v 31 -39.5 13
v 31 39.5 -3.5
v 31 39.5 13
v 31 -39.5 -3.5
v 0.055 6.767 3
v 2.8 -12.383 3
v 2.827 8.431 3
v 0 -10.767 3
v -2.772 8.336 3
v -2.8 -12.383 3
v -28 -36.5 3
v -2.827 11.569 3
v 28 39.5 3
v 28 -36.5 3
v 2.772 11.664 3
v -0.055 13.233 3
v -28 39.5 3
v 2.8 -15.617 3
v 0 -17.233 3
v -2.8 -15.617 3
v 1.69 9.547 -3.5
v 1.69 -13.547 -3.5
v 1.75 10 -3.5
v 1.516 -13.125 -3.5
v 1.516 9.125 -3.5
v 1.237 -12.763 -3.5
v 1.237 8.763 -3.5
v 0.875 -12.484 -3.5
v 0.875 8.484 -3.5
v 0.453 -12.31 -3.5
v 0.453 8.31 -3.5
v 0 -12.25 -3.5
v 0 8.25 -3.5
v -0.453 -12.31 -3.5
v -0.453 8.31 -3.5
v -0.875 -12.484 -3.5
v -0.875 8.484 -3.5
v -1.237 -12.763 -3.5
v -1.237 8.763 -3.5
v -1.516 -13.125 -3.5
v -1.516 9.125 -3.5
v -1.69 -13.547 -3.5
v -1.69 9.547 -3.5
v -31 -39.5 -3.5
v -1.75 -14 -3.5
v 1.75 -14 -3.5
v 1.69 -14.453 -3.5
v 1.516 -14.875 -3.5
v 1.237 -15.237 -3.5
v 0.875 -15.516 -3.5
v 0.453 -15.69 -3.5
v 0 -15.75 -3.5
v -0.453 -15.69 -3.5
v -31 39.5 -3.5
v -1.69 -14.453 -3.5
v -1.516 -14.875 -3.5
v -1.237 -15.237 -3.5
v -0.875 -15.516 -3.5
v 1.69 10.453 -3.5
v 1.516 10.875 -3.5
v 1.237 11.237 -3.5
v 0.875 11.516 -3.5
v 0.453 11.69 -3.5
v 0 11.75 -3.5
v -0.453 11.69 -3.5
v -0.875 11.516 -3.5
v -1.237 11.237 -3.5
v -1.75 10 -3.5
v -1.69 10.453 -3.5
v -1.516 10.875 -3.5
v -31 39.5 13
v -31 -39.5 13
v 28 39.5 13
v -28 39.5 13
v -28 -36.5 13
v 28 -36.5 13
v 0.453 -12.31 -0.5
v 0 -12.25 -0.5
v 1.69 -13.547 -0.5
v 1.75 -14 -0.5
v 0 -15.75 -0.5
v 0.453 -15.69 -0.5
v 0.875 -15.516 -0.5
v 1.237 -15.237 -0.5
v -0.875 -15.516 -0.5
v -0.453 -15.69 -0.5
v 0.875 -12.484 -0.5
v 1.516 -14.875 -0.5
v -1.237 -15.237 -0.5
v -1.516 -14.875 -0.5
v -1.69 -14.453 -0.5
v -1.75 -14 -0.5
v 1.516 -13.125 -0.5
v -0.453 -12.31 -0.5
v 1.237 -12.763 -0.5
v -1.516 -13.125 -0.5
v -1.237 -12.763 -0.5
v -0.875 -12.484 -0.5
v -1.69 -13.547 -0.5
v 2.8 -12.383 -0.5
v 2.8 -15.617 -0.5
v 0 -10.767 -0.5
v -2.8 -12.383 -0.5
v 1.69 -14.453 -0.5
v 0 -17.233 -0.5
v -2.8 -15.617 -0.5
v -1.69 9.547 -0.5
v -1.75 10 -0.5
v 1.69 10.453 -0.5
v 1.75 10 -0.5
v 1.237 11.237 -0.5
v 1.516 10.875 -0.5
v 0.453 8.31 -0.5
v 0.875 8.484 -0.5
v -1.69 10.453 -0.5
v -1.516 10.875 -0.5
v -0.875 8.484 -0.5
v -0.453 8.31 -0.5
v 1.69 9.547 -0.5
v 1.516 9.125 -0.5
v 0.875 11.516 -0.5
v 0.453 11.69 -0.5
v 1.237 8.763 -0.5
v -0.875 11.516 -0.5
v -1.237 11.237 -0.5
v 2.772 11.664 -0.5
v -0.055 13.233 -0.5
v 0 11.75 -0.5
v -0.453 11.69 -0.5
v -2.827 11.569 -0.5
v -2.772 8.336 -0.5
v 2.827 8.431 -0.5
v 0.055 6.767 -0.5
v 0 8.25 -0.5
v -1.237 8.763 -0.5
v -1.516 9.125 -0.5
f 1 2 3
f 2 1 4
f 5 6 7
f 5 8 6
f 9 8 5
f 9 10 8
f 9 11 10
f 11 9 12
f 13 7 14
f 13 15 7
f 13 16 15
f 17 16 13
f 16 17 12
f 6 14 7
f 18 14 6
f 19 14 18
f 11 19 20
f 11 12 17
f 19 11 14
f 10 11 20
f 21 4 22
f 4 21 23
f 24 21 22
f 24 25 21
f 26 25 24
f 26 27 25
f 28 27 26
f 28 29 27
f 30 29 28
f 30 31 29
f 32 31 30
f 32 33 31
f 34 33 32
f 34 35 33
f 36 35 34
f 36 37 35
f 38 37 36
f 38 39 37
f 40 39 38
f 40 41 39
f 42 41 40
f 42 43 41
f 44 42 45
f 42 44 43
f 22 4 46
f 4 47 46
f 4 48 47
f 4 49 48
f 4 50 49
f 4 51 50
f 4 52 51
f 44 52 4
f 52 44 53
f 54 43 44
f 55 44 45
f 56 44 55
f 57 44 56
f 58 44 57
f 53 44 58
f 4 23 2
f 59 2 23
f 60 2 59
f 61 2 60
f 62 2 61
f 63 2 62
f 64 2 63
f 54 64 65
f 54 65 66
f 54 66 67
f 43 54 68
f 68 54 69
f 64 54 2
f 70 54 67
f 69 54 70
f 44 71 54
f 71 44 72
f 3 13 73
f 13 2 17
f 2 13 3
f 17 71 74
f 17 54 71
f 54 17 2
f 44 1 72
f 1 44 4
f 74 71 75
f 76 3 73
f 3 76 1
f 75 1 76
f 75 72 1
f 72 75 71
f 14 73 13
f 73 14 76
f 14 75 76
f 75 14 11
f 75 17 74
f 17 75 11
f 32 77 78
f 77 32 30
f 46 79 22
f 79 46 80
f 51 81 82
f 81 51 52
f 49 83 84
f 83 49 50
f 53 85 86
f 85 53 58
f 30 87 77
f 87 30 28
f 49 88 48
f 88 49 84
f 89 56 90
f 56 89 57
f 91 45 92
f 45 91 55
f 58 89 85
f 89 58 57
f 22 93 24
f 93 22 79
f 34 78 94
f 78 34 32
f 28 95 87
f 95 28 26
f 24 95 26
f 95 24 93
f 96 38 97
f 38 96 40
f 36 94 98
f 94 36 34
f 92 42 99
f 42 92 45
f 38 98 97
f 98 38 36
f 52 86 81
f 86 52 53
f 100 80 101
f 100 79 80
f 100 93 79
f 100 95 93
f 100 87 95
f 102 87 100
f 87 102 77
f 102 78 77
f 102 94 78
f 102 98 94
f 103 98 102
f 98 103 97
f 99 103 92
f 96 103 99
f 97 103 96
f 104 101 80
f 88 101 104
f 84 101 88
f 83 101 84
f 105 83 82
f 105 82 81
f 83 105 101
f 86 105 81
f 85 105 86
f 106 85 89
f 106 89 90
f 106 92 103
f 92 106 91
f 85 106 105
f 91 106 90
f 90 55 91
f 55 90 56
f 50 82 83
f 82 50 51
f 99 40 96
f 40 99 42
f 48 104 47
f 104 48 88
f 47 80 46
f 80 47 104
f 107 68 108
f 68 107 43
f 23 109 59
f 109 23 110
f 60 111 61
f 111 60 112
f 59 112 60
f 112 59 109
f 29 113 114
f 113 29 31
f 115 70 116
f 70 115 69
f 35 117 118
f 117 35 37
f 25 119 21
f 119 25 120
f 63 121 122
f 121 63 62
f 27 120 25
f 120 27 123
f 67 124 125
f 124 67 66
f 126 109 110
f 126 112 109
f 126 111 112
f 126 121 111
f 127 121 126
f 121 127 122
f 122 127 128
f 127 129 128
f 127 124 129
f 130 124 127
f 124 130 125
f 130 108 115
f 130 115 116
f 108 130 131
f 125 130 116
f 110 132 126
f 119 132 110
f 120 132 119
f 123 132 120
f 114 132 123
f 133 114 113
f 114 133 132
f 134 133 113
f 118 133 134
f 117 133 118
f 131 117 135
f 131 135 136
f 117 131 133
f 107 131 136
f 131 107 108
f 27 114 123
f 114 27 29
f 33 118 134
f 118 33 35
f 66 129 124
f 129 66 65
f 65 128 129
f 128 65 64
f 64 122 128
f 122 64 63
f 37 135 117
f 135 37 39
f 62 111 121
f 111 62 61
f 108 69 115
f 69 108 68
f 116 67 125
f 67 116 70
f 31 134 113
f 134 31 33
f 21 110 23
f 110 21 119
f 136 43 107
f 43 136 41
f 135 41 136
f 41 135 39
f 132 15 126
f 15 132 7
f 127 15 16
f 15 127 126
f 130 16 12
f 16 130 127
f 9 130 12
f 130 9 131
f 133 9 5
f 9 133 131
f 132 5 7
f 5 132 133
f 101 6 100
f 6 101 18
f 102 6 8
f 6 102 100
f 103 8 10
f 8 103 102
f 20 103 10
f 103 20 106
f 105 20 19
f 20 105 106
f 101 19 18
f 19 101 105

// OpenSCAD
// Editable recovery of 3DPrintMeshes/dynamixel_specific/lipo_battery_mount.stl.
// Render: openscad -o lipo_battery_mount.stl lipo_battery_mount.scad

base_z = -3.5;
transition_z = -0.5;
floor_z = 3;
top_z = 13;

module lipo_battery_mount() {
    difference() {
        union() {
            translate([-31, -39.5, base_z]) cube([62, 79, floor_z - base_z]);
            translate([0, 0, floor_z])
                linear_extrude(top_z - floor_z)
                    difference() {
                        translate([-31, -39.5]) square([62, 79]);
                        translate([-28, -36.5]) square([56, 76]);
                    }
        }

        // Through holes are round below transition_z and hexagonal above it.
        for (center = [[0, -14], [0, 10]])
            translate([center[0], center[1], base_z])
                cylinder(h = transition_z - base_z, r = 1.75, $fn = 24);

        translate([0, 0, transition_z])
            linear_extrude(floor_z - transition_z) {
                polygon([
                    [0, -17.233161], [2.8, -15.616581], [2.8, -12.383419],
                    [0, -10.766839], [-2.8, -12.383419], [-2.8, -15.616581]
                ]);
                polygon([
                    [-2.827208, 11.568512], [-2.771975, 8.335822], [0.055232, 6.767310],
                    [2.827208, 8.431488], [2.771975, 11.664177], [-0.055232, 13.232689]
                ]);
            }
    }
}

lipo_battery_mount();
